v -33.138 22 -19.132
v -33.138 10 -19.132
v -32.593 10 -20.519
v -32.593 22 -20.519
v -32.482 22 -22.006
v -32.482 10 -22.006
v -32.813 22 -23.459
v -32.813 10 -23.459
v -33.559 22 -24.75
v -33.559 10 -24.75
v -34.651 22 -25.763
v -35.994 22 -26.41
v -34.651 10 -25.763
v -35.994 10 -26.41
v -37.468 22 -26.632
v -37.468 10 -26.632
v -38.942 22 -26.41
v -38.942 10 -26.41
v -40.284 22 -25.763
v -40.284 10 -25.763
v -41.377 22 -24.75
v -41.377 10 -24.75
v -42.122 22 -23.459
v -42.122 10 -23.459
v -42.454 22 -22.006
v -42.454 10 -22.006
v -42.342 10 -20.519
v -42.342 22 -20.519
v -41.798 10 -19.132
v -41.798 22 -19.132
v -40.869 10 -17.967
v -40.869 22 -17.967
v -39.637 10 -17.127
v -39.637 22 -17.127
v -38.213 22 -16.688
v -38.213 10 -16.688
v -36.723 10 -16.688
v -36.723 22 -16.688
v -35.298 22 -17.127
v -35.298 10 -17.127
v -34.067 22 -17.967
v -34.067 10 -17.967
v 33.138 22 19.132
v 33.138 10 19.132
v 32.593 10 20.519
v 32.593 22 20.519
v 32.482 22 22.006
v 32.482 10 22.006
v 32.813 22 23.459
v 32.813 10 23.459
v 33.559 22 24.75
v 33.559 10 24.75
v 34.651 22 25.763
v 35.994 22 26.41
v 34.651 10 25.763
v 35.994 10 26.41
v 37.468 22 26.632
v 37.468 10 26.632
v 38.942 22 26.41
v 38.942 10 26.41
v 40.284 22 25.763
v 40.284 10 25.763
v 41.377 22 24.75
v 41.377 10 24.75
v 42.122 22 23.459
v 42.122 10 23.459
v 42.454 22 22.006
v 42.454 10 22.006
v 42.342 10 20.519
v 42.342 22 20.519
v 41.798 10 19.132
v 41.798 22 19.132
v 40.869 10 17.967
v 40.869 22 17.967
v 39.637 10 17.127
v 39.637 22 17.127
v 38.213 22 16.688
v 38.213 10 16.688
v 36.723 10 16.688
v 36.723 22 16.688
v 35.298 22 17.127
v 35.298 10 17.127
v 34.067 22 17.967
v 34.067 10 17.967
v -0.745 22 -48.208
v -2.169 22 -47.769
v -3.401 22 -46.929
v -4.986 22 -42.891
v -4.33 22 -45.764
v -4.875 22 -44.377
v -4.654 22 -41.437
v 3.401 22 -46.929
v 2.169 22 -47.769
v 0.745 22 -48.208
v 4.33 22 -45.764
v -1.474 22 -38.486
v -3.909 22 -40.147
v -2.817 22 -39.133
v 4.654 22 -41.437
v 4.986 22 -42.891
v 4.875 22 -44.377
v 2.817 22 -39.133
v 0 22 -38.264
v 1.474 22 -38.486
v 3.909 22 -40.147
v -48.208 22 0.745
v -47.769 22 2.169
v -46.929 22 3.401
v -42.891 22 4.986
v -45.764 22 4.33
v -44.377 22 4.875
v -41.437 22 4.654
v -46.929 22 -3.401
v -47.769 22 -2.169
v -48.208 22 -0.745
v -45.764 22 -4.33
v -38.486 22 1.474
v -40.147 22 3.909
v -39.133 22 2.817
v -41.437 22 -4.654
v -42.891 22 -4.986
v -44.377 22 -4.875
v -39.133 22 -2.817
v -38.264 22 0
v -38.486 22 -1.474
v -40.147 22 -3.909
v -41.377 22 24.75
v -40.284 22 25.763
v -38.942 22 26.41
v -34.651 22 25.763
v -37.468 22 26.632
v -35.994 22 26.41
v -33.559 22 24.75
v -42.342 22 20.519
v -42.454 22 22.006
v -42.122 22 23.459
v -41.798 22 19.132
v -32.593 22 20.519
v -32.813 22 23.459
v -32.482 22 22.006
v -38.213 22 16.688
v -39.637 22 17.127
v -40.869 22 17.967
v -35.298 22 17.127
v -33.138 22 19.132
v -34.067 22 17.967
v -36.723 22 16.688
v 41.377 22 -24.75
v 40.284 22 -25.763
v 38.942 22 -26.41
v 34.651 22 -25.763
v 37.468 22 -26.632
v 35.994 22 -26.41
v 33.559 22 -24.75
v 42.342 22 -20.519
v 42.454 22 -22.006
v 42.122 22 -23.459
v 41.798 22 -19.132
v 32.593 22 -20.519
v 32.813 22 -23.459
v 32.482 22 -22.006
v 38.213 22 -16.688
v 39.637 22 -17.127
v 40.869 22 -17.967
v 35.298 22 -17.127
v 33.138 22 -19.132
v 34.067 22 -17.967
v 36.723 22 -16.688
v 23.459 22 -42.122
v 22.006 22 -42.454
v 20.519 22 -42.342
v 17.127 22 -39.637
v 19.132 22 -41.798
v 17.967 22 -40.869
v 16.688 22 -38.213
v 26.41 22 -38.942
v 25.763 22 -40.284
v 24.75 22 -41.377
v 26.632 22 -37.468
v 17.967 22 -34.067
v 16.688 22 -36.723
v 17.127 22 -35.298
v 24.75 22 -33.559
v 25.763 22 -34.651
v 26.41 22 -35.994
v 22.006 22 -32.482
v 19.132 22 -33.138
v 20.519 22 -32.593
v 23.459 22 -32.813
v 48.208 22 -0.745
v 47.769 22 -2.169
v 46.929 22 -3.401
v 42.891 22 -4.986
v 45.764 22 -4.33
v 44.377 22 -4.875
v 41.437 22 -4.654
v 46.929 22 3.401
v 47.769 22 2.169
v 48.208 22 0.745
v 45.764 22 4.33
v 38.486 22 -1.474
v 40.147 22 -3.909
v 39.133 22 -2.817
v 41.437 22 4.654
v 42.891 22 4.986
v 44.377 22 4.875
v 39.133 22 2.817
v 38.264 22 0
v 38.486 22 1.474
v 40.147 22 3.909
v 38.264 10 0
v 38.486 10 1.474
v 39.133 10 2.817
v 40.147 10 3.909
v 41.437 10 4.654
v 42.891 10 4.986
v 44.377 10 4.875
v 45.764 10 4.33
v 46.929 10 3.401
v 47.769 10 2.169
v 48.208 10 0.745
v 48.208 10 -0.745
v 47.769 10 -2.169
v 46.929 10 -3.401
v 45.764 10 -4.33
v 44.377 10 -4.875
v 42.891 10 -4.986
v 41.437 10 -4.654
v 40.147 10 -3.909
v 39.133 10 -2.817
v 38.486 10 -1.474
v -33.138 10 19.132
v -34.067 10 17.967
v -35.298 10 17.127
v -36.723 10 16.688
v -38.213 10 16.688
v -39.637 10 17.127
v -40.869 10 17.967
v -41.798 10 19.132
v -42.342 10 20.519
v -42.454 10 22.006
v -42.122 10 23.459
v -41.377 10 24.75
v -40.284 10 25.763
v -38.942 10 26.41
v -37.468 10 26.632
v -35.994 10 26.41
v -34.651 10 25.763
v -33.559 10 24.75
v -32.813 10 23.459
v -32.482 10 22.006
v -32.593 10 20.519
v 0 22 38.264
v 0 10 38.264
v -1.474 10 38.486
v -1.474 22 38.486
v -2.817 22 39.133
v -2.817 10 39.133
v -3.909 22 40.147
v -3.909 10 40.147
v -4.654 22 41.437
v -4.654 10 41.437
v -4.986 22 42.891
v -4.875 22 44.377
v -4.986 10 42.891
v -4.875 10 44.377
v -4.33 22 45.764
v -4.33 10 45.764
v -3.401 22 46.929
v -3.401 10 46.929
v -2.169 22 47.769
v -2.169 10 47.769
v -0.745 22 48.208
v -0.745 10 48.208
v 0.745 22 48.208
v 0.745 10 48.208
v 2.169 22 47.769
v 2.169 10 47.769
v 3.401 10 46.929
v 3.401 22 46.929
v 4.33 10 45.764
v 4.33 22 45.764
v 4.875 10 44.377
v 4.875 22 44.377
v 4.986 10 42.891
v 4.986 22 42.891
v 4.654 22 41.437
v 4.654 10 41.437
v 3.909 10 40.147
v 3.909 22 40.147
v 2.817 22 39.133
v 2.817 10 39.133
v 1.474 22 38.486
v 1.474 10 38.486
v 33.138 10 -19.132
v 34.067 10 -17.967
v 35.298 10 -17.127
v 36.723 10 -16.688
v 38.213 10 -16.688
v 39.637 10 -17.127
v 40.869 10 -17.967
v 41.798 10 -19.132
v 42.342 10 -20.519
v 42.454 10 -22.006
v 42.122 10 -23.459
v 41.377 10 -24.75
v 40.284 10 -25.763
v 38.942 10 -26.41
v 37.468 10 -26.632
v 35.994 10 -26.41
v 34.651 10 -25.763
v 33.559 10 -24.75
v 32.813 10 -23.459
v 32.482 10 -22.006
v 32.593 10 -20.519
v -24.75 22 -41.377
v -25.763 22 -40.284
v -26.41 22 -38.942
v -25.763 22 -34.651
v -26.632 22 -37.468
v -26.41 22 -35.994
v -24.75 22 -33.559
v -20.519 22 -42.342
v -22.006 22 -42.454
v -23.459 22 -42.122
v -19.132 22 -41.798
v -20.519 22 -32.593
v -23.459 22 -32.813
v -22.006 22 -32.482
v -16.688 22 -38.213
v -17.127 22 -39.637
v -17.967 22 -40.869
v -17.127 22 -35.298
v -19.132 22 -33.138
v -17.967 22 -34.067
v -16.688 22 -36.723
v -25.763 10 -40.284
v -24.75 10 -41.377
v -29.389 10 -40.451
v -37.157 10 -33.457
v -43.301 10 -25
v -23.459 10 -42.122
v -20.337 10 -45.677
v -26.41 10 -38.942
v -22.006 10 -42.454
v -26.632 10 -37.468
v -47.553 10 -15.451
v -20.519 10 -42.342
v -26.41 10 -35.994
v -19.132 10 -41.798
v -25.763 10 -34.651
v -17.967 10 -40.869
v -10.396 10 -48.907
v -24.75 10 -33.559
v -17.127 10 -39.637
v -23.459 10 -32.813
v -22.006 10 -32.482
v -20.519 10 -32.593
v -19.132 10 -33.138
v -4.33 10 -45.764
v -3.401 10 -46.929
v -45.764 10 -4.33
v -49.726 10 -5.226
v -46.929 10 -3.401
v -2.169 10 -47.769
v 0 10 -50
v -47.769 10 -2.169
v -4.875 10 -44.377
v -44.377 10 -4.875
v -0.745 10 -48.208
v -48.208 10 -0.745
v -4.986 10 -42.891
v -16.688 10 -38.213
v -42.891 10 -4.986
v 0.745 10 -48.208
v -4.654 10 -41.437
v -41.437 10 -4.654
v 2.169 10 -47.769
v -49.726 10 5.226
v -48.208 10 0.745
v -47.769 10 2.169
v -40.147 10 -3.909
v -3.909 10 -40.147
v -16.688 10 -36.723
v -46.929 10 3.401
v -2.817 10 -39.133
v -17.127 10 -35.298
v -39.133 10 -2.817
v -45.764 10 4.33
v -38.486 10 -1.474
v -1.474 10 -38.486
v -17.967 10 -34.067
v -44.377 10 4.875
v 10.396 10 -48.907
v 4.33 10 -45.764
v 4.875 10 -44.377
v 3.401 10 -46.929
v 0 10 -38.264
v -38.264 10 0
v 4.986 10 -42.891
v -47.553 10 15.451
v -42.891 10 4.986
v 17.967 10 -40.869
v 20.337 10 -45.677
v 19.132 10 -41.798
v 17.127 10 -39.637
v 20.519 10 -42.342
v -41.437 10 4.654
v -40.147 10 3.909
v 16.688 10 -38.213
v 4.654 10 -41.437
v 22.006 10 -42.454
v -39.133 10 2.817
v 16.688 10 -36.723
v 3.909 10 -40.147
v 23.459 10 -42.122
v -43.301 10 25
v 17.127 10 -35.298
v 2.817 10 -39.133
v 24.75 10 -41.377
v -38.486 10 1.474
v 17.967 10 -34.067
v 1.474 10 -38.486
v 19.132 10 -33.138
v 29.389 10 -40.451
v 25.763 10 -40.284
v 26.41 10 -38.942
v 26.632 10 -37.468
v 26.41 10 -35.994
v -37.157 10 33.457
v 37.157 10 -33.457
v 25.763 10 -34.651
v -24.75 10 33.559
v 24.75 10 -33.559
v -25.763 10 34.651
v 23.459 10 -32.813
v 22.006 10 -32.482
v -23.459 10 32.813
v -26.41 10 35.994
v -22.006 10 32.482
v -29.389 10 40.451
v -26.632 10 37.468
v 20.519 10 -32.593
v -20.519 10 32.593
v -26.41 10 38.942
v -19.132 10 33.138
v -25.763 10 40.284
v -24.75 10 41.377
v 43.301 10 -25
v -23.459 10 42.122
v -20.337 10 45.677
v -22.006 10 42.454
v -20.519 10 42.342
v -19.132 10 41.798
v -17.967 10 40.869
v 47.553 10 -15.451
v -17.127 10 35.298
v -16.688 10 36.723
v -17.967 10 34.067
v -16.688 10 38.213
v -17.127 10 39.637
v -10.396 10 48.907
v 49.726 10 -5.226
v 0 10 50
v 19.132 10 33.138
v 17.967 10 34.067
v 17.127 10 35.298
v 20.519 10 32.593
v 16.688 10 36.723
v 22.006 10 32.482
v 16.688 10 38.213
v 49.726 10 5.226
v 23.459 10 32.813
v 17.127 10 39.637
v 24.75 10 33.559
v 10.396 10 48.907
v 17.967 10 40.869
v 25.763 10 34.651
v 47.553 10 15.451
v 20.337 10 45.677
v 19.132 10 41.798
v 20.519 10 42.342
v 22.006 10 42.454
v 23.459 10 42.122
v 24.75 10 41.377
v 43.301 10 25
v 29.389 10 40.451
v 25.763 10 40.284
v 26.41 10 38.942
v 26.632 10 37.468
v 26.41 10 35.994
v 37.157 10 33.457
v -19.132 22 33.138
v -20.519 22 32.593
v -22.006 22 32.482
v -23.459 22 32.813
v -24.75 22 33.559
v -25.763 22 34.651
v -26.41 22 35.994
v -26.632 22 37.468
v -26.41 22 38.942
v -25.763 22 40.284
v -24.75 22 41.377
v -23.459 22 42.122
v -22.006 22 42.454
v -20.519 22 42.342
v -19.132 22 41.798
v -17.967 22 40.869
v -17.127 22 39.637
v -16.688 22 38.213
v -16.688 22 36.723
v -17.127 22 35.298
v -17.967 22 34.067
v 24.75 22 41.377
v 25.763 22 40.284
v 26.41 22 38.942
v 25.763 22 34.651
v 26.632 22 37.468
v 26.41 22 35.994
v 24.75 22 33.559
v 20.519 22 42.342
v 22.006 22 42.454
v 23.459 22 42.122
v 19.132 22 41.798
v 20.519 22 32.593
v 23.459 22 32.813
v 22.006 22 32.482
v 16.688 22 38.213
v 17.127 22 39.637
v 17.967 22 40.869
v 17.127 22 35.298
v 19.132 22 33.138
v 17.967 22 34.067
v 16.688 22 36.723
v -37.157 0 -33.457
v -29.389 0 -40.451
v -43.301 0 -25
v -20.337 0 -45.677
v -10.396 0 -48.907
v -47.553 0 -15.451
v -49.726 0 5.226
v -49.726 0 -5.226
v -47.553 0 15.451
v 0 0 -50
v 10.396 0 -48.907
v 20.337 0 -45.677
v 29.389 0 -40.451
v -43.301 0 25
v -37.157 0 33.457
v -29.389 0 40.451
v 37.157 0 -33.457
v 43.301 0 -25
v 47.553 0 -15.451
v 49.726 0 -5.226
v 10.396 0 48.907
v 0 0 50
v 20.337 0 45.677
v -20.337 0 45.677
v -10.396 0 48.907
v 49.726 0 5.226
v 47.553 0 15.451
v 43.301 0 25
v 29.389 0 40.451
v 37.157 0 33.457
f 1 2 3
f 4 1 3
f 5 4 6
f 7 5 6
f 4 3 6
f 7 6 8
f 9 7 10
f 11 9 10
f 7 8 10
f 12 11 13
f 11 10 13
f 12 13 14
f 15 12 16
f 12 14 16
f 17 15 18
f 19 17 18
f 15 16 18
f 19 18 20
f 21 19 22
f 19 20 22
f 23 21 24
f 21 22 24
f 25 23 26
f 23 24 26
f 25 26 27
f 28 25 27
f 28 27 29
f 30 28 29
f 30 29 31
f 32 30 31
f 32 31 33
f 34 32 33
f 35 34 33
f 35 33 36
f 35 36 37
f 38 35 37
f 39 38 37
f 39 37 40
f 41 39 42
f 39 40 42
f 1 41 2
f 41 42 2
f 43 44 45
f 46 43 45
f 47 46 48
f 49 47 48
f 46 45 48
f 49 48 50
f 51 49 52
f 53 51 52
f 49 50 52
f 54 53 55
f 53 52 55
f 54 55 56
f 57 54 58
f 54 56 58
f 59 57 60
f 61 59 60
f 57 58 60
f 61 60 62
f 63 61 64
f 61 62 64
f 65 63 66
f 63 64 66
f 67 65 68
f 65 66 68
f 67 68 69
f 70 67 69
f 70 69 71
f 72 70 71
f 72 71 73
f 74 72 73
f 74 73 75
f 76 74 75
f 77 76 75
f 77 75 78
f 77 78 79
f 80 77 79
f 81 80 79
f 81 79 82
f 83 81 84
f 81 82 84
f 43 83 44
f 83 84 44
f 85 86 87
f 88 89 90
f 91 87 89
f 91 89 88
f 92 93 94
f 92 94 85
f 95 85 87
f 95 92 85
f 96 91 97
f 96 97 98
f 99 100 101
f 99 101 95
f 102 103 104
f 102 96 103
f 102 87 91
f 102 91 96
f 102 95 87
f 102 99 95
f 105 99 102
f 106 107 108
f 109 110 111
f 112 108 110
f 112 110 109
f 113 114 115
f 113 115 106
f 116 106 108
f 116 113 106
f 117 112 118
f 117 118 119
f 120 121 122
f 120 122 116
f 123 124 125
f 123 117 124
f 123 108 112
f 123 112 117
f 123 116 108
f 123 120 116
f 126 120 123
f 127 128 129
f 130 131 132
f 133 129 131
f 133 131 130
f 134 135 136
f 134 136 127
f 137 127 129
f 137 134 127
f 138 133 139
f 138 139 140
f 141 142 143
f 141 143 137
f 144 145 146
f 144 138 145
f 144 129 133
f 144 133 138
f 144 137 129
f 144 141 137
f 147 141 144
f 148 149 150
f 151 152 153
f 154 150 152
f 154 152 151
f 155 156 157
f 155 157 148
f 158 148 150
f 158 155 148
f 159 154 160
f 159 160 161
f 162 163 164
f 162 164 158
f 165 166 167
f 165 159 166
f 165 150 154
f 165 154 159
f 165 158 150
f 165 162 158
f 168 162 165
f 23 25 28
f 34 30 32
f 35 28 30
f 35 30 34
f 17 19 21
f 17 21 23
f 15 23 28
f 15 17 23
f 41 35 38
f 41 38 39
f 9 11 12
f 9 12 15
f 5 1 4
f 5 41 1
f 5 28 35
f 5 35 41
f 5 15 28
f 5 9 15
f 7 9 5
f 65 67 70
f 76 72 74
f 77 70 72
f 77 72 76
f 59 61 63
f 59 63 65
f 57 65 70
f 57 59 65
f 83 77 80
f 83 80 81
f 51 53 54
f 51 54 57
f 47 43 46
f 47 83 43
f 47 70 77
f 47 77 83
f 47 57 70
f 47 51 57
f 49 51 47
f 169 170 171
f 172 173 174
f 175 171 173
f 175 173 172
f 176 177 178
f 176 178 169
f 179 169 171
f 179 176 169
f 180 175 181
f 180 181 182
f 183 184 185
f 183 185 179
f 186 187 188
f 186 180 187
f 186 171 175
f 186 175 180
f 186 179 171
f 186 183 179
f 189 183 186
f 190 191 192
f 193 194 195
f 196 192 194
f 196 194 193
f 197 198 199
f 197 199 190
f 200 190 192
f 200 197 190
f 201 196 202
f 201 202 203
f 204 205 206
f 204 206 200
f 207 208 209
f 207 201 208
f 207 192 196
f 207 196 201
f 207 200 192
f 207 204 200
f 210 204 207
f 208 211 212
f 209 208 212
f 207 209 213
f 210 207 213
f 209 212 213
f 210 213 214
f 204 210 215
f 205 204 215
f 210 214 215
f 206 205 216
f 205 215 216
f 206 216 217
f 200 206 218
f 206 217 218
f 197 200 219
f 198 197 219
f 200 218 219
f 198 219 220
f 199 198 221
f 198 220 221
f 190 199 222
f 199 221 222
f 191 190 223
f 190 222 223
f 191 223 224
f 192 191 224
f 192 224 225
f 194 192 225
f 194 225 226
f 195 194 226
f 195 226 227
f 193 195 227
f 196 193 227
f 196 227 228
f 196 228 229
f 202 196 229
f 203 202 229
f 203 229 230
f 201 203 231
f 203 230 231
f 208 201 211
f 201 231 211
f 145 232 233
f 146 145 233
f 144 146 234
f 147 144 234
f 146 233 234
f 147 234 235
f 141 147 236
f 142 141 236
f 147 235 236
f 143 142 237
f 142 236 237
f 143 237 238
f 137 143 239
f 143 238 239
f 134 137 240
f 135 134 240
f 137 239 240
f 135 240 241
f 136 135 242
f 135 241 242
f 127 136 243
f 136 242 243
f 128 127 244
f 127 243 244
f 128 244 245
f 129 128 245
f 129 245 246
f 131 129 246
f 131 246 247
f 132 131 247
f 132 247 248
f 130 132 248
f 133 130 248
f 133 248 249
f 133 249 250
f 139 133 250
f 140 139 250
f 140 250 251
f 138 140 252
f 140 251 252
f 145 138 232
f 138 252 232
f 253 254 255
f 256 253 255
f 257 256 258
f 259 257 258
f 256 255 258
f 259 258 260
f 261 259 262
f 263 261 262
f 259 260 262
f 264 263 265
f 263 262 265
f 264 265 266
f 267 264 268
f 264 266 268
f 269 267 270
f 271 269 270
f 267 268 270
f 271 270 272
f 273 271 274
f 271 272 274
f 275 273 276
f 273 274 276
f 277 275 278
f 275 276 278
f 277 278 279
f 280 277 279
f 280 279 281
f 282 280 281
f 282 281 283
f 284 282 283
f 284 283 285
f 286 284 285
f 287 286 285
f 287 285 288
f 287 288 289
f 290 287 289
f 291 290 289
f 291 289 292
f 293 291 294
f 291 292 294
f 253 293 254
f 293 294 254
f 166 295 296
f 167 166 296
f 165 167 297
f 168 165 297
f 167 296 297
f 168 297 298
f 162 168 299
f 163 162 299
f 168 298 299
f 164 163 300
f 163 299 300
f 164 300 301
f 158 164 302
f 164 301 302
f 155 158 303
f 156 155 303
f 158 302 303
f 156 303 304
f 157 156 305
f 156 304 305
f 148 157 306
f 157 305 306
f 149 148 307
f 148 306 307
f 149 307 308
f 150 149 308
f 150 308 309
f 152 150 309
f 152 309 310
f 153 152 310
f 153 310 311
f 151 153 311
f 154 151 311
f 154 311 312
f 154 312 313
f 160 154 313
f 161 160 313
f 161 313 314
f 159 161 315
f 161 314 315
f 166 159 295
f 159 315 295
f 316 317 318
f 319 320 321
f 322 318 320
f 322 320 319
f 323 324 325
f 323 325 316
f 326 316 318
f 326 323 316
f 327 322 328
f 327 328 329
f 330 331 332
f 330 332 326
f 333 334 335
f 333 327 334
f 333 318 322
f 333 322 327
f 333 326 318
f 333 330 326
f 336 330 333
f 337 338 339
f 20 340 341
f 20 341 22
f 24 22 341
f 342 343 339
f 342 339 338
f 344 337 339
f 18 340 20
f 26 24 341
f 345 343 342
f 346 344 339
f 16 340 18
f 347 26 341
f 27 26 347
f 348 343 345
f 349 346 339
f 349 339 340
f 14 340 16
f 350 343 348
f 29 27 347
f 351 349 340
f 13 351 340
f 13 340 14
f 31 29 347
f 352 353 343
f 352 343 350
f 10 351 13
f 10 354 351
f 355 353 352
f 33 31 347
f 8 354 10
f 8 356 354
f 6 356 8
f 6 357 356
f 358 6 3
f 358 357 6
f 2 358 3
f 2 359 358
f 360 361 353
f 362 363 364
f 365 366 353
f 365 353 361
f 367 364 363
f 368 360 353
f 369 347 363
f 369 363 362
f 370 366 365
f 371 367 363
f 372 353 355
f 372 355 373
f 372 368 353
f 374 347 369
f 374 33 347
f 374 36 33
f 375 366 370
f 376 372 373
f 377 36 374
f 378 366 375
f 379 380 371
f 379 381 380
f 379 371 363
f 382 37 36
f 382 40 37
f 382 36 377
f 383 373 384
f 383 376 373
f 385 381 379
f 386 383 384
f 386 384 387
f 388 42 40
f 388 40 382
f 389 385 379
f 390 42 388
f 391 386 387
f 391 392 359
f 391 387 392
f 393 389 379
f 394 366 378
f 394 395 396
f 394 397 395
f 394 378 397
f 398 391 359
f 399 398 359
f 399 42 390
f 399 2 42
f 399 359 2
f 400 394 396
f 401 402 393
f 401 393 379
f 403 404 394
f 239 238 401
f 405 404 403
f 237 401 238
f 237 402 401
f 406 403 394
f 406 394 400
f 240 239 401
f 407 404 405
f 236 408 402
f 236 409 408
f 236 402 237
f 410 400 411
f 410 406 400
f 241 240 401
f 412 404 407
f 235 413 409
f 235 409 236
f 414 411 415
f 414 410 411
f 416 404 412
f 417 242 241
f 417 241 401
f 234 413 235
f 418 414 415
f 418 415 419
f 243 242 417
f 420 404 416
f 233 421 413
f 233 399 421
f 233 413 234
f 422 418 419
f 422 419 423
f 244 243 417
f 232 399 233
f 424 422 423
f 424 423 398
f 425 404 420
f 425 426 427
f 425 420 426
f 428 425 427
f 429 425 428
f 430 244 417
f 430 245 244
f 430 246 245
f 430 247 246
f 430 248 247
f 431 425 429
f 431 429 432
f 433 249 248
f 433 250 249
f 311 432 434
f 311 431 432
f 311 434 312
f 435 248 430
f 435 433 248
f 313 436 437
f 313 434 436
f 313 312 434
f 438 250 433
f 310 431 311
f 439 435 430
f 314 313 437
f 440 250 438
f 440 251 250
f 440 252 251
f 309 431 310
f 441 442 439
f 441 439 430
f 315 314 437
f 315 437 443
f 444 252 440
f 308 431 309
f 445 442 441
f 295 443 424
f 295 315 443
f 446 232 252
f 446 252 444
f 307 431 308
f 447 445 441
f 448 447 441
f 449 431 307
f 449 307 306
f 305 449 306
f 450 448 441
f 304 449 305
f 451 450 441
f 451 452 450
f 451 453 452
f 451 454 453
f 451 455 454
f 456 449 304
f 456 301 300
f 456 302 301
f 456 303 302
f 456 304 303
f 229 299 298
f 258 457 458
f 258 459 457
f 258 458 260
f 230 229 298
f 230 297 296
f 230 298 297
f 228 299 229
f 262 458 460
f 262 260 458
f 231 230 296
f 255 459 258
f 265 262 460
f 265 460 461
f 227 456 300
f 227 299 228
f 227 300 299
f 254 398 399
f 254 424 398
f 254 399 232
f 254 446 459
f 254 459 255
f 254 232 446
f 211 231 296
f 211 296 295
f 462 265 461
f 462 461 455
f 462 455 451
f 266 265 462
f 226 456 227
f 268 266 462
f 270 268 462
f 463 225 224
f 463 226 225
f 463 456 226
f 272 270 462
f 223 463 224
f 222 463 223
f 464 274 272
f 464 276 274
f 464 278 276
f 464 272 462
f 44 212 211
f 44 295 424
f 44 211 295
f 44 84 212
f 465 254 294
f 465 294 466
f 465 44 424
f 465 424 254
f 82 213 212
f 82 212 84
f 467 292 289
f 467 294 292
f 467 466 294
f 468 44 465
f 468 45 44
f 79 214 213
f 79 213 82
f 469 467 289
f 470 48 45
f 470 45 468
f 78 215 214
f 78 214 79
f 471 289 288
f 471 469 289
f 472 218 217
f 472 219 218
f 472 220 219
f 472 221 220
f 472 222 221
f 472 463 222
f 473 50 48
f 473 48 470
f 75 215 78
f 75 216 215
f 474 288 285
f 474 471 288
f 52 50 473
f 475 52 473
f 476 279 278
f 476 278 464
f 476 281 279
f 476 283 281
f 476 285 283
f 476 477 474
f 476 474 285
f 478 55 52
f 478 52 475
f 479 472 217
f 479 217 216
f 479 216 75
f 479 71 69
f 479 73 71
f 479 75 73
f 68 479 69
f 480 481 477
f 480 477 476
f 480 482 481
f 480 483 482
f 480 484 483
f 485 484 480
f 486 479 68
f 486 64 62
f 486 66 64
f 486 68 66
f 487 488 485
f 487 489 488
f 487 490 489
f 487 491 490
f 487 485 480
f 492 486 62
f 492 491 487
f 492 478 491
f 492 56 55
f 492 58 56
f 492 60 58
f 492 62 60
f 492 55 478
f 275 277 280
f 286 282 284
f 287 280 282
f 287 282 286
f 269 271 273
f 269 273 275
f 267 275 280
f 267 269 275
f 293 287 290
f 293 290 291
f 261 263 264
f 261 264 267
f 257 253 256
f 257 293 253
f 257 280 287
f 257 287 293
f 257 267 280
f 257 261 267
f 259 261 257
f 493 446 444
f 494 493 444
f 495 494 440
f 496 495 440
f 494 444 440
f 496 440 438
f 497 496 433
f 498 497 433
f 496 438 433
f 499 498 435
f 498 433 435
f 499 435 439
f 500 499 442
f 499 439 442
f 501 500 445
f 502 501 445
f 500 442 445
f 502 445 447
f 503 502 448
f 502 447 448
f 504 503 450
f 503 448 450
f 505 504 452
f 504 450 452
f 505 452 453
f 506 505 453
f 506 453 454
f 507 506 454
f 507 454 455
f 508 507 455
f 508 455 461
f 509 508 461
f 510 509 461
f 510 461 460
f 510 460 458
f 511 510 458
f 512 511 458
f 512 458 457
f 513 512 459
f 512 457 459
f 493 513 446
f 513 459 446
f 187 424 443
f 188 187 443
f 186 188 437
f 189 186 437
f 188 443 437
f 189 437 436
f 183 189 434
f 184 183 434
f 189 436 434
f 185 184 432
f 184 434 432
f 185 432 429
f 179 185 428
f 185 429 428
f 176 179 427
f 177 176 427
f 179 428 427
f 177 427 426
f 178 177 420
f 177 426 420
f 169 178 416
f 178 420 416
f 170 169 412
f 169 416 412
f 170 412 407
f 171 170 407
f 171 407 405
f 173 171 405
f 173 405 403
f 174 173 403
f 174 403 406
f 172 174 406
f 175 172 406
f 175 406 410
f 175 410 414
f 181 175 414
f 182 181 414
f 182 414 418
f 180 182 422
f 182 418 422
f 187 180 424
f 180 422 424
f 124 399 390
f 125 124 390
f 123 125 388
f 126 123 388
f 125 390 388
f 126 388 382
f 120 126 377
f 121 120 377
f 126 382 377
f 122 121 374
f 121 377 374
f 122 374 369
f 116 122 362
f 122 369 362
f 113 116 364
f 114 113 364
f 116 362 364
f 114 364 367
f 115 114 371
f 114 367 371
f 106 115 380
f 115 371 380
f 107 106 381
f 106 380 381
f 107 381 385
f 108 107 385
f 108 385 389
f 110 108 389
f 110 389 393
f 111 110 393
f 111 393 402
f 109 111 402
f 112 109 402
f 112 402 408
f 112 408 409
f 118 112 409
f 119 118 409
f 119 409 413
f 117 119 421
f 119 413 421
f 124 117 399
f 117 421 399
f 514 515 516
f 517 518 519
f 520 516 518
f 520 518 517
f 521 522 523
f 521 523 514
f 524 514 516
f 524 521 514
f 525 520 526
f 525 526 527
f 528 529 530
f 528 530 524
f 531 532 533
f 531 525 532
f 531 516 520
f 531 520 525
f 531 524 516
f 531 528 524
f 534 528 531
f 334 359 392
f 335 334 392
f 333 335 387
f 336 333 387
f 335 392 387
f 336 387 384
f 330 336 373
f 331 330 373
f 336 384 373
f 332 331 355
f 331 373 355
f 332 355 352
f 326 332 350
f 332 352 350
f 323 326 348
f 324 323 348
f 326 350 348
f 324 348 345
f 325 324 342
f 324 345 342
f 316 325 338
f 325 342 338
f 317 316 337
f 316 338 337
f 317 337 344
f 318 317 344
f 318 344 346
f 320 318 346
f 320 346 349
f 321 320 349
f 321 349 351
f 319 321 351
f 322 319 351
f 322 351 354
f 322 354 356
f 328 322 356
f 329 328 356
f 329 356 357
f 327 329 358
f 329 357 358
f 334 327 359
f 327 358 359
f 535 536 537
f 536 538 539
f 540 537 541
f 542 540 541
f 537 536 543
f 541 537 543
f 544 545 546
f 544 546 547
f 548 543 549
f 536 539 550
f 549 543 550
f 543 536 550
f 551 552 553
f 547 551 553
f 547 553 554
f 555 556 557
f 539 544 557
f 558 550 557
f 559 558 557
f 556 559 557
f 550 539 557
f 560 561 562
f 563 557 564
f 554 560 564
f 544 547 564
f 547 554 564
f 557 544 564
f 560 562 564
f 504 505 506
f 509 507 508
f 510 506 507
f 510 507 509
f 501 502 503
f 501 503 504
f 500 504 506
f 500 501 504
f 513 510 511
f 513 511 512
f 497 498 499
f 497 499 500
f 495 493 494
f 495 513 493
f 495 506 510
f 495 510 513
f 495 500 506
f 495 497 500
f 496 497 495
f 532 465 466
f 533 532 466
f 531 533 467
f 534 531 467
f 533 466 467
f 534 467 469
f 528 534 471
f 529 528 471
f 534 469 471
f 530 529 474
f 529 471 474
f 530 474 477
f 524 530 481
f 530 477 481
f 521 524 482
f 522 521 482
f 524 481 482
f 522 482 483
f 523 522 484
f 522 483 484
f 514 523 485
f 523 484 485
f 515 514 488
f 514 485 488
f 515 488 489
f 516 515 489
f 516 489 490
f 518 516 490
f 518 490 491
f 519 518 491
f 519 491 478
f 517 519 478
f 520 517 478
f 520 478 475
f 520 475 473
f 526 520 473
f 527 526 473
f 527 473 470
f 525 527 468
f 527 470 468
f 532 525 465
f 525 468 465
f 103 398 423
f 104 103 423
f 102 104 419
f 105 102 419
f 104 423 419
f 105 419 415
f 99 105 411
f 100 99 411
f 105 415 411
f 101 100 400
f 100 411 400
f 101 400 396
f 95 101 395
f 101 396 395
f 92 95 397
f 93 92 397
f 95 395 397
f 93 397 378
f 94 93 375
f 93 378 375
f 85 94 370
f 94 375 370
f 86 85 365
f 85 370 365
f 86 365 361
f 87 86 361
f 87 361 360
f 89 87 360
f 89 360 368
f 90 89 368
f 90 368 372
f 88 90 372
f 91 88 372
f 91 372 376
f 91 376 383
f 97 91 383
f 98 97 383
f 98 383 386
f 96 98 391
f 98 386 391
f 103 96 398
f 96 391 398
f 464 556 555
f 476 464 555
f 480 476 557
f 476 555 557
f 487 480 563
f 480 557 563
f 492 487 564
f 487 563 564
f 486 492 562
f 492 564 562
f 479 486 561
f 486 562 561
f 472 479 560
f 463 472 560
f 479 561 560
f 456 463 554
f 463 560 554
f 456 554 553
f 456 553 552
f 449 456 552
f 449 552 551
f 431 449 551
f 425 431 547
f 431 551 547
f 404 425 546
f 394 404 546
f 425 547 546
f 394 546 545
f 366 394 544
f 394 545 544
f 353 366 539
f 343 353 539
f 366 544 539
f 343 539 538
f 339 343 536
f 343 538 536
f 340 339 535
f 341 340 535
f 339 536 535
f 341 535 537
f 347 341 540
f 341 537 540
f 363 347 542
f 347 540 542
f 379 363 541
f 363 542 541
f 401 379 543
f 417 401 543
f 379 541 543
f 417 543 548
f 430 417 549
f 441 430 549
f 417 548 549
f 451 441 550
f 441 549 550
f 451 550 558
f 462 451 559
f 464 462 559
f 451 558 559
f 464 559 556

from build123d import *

# Parameters (mm, degrees)
CROQUIS3_R              = 50
SALIENTE_EXTRUIR2_DEPTH = 10
CROQUIS4_R              = 5
SALIENTE_EXTRUIR3_DEPTH = 12
MATRIZC1_COUNT          = 12


with BuildPart() as part:
    # Croquis3 → Saliente-Extruir2 (new body)
    with BuildSketch(Plane(origin=(0, 0, 0), x_dir=(1, 0, 0), z_dir=(0, 1, 0))):
        with Locations(Location((0, 0, 0), (0, 0, 270))):
            Circle(CROQUIS3_R)
    extrude(amount=SALIENTE_EXTRUIR2_DEPTH)

    # Croquis4 → Saliente-Extruir3 (add)
    with BuildSketch(Plane(origin=(0, 10, 0), x_dir=(1, 0, 0), z_dir=(0, 1, 0))):
        with Locations(Location((0, 43.264151253, 0), (0, 0, 270))):
            Circle(CROQUIS4_R)
    saliente_extruir3 = extrude(amount=SALIENTE_EXTRUIR3_DEPTH)

    # MatrizC1: Saliente-Extruir3 ×12 about axis
    matrizc1_axis = Axis((0, 0, 0), (0, 1, 0))
    for i in range(1, MATRIZC1_COUNT):
        add(saliente_extruir3.rotate(matrizc1_axis, i * 360 / MATRIZC1_COUNT))


solid = part.part
